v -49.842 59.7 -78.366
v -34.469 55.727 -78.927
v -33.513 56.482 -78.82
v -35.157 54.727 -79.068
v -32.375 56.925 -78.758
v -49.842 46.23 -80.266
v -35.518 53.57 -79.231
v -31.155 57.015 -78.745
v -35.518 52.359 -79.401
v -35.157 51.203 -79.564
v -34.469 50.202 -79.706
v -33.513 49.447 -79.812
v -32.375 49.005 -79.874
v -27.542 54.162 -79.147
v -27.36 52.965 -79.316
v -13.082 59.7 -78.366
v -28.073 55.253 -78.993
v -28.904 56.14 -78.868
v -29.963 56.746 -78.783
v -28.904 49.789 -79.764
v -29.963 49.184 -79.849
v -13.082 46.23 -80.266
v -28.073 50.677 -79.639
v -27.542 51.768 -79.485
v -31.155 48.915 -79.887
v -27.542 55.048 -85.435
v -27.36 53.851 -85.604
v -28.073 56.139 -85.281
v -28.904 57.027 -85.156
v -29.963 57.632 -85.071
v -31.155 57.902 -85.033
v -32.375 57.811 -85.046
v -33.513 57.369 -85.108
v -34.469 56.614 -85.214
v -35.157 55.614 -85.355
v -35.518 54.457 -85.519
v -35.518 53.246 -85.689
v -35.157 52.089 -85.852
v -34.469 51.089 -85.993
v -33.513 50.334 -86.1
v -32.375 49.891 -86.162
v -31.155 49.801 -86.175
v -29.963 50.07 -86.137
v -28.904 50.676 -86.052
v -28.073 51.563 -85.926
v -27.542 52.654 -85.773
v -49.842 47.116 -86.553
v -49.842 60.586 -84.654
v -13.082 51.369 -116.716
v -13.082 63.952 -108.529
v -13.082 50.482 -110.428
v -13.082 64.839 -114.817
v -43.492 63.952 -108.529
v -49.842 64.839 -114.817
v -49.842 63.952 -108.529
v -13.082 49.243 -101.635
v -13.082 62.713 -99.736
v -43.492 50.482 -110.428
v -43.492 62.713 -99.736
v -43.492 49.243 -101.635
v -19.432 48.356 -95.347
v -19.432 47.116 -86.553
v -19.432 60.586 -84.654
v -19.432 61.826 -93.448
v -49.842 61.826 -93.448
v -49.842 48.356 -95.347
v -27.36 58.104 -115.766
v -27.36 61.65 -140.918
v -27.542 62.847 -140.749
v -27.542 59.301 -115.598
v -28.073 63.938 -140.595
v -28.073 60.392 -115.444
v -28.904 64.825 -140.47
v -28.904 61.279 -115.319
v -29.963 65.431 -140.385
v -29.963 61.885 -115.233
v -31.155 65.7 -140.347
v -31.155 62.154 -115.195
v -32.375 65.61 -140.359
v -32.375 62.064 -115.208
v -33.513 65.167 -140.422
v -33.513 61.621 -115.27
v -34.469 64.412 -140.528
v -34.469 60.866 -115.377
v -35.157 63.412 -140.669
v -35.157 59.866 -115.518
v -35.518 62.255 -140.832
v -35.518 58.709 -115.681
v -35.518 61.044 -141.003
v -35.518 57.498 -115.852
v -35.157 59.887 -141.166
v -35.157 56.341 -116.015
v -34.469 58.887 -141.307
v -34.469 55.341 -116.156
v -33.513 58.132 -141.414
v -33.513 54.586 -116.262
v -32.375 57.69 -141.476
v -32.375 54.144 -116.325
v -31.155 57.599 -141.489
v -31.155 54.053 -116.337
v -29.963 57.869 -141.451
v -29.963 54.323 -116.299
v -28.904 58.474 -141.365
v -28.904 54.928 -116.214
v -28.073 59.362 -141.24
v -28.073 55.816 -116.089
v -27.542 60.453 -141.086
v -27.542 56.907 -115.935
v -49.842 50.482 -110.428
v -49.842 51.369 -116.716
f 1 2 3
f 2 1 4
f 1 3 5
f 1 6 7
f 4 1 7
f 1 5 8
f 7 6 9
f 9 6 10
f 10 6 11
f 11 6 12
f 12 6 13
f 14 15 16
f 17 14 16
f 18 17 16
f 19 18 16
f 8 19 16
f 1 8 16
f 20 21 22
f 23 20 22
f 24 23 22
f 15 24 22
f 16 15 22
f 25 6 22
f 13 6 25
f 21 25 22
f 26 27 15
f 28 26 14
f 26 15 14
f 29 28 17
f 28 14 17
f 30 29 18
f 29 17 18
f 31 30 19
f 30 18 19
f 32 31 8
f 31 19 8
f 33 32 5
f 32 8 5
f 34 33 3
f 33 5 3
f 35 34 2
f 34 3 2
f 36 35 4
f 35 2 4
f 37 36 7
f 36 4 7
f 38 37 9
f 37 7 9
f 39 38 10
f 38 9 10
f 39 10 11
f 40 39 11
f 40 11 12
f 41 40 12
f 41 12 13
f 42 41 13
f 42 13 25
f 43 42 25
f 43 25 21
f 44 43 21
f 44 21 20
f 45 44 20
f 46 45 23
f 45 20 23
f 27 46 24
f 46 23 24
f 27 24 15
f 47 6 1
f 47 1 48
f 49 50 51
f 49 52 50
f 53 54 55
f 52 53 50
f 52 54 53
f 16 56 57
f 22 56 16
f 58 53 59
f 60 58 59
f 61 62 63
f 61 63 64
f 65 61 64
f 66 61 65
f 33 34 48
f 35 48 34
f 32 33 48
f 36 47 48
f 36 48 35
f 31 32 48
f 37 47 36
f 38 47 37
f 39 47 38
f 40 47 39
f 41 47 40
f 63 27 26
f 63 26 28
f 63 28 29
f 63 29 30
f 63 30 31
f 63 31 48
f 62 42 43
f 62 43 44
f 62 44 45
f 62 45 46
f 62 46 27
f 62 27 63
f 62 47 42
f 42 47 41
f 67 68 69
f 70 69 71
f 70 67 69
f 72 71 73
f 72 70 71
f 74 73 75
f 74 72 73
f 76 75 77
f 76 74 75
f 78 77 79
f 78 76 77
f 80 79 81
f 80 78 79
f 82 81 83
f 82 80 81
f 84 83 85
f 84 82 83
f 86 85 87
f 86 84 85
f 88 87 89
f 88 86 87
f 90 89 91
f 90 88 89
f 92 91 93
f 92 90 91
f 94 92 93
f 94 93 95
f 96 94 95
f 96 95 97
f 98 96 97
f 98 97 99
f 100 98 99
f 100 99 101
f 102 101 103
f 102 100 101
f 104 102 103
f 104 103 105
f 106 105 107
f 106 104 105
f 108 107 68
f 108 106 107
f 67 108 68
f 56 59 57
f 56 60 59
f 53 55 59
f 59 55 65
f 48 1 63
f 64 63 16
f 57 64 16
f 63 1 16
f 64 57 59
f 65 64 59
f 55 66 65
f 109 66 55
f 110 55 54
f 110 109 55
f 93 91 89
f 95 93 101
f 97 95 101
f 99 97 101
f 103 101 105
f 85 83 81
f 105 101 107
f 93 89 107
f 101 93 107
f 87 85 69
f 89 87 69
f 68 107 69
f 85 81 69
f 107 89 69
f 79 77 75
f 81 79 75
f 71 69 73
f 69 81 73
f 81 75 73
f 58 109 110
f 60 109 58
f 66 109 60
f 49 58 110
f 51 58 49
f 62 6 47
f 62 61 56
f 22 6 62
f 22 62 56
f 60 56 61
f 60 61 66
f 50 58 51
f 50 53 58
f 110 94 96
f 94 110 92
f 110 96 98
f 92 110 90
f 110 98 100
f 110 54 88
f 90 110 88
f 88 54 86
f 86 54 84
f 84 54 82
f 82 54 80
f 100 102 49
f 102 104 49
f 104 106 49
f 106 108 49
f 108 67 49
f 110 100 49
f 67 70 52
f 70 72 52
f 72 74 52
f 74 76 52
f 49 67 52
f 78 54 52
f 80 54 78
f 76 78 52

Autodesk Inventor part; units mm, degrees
ref_plane "YZ Plane" through (0, 0, 0) normal (1, 0, 0) x (0, 1, 0)
ref_plane "XZ Plane" through (0, 0, 0) normal (0, 1, 0) x (-1, 0, 0)
ref_plane "XY Plane" through (0, 0, 0) normal (0, 0, 1) x (1, 0, 0)
ref_plane "Work Plane1" through (46.4934, 164.1502, -100.8153) normal (0, -0.1396054, 0.9902072) x (1, 0, 0)
sketch "Sketch1" plane through (46.4934, 164.1502, -100.8153) normal (0, -0.1396054, 0.9902072) x (1, 0, 0)
  circle A0 centre (-77.9553, -107.0952) radius 4.3235 projected
  circle A1 centre (-77.9553, -107.0952) radius 4.1018
  point P0 (-46.4934, -148.4684)
extrude "Extrusion1" add sketch "Sketch1" against normal blind 25.4 contours A1
thread "Thread1" size "3/8-16 UNC" class "2A" standard "ANSI Unified Screw Threads" length 11
sketch "Sketch2" plane through (46.4934, 164.1502, -100.8153) normal (0, -0.1396054, 0.9902072) x (1, 0, 0)
  circle A0 centre (-77.9553, -107.0952) radius 4.3235 construction
  line L0 (0, -50.1427) -> (0, 0) construction
  arc A1 (-38.2285, -91.2202) -> (0, -50.1427) centre (-77.9553, -15.9215) ccw construction
  line L1 (-38.2285, -91.2202) -> (-117.6821, -91.2202) construction
  arc A2 (-155.9106, -50.1427) -> (-117.6821, -91.2202) centre (-77.9553, -15.9215) ccw construction
  line L2 (-155.9106, -50.1427) -> (-155.9106, 0) construction
  line L3 (-155.9106, 0) -> (-159.0856, 0) construction
  line L4 (-159.0856, -50.1427) -> (-159.0856, 0) construction
  arc A3 (-159.0856, -50.1427) -> (-117.8938, -94.3952) centre (-77.9553, -15.9215) ccw construction
  line L5 (-117.8938, -94.3952) -> (-103.6066, -94.3952) construction
  line L6 (-103.6066, -94.3952) -> (-103.6066, -119.7952) construction
  line L7 (-52.304, -119.7952) -> (-103.6066, -119.7952) construction
  line L8 (-52.304, -94.3952) -> (-52.304, -119.7952) construction
  line L9 (-52.304, -94.3952) -> (-38.0167, -94.3952) construction
  arc A4 (-38.0167, -94.3952) -> (3.175, -50.1427) centre (-77.9553, -15.9215) ccw construction
  line L10 (3.175, 0) -> (3.175, -50.1427) construction
  line L11 (0, 0) -> (3.175, 0) construction
  line L12 (-96.3354, -100.2936) -> (-59.5752, -100.2936)
  line L13 (-59.5752, -100.2936) -> (-59.5752, -113.8968)
  line L14 (-59.5752, -113.8968) -> (-96.3354, -113.8968)
  line L15 (-96.3354, -113.8968) -> (-96.3354, -100.2936)
  line L16 (-96.3354, -107.0952) -> (-59.5752, -107.0952) construction
  line L17 (-77.9553, -100.2936) -> (-77.9553, -113.8968) construction
  point P0 (-46.4934, -148.4684)
extrude "Extrusion2" add sketch "Sketch2" along normal blind 6.35
sketch "Sketch4" plane through (-49.842, 51.3688, -116.7159) normal (0, -0.9902072, -0.1396054) x (1, 0, 0)
  line L0 (0, 0) -> (36.7602, 0) construction
  line L1 (36.7602, 0) -> (36.7602, 6.35) construction
  line L2 (0, 6.35) -> (36.7602, 6.35) construction
  line L3 (0, 0) -> (0, 6.35) construction
  line L4 (0, 15.2304) -> (36.7602, 15.2304) construction
  line L5 (36.7602, 21.5804) -> (0, 21.5804) construction
  line L6 (0, 21.5804) -> (0, 15.2304) construction
  line L7 (30.4102, 59.9083) -> (30.4102, 21.5804) construction
  line L8 (0, 30.4608) -> (30.4102, 30.4608) construction
  line L9 (0, 30.4608) -> (0, 36.8108) construction
  line L10 (6.35, 6.35) -> (6.35, 15.2304) construction
  line L11 (36.7602, 36.8108) -> (0, 36.8108) construction
  line L12 (0, 30.4608) -> (0, 36.8108) construction
  line L13 (36.7602, 15.2304) -> (36.7602, 36.8108) construction
  line L14 (0, 0) -> (0, 21.5804) construction
  line L15 (6.35, 6.35) -> (6.35, 15.2304)
  line L16 (6.35, 15.2304) -> (36.7602, 15.2304)
  line L17 (36.7602, 15.2304) -> (36.7602, 36.8108)
  line L18 (0, 36.8108) -> (36.7602, 36.8108)
  line L19 (0, 36.8108) -> (0, 30.4608)
  line L20 (0, 30.4608) -> (30.4102, 30.4608)
  line L21 (30.4102, 30.4608) -> (30.4102, 21.5804)
  line L22 (30.4102, 21.5804) -> (0, 21.5804)
  line L23 (0, 21.5804) -> (0, 6.35)
  line L24 (0, 6.35) -> (6.35, 6.35)
  line L25 (0, 6.35) -> (36.7602, 6.35) projected
  point P0 (49.842, 122.7443)
  dimension "d7" = 6.35
  dimension "d11" = 6.35
  dimension "d12" = 6.35
  dimension "d13" = 6.35
extrude "Extrusion3" add sketch "Sketch4" against normal up to surface (13.6032 mm away)
sketch "Sketch5" plane through (-49.842, 46.2298, -80.2656) normal (0, -0.1396054, 0.9902072) x (1, 0, 0)
  circle A0 centre (18.3801, 6.8016) radius 4.1018 projected
  point P0 (49.842, -34.5716)
extrude "Extrusion4" cut sketch "Sketch5" against normal up to surface (6.35 mm away)
